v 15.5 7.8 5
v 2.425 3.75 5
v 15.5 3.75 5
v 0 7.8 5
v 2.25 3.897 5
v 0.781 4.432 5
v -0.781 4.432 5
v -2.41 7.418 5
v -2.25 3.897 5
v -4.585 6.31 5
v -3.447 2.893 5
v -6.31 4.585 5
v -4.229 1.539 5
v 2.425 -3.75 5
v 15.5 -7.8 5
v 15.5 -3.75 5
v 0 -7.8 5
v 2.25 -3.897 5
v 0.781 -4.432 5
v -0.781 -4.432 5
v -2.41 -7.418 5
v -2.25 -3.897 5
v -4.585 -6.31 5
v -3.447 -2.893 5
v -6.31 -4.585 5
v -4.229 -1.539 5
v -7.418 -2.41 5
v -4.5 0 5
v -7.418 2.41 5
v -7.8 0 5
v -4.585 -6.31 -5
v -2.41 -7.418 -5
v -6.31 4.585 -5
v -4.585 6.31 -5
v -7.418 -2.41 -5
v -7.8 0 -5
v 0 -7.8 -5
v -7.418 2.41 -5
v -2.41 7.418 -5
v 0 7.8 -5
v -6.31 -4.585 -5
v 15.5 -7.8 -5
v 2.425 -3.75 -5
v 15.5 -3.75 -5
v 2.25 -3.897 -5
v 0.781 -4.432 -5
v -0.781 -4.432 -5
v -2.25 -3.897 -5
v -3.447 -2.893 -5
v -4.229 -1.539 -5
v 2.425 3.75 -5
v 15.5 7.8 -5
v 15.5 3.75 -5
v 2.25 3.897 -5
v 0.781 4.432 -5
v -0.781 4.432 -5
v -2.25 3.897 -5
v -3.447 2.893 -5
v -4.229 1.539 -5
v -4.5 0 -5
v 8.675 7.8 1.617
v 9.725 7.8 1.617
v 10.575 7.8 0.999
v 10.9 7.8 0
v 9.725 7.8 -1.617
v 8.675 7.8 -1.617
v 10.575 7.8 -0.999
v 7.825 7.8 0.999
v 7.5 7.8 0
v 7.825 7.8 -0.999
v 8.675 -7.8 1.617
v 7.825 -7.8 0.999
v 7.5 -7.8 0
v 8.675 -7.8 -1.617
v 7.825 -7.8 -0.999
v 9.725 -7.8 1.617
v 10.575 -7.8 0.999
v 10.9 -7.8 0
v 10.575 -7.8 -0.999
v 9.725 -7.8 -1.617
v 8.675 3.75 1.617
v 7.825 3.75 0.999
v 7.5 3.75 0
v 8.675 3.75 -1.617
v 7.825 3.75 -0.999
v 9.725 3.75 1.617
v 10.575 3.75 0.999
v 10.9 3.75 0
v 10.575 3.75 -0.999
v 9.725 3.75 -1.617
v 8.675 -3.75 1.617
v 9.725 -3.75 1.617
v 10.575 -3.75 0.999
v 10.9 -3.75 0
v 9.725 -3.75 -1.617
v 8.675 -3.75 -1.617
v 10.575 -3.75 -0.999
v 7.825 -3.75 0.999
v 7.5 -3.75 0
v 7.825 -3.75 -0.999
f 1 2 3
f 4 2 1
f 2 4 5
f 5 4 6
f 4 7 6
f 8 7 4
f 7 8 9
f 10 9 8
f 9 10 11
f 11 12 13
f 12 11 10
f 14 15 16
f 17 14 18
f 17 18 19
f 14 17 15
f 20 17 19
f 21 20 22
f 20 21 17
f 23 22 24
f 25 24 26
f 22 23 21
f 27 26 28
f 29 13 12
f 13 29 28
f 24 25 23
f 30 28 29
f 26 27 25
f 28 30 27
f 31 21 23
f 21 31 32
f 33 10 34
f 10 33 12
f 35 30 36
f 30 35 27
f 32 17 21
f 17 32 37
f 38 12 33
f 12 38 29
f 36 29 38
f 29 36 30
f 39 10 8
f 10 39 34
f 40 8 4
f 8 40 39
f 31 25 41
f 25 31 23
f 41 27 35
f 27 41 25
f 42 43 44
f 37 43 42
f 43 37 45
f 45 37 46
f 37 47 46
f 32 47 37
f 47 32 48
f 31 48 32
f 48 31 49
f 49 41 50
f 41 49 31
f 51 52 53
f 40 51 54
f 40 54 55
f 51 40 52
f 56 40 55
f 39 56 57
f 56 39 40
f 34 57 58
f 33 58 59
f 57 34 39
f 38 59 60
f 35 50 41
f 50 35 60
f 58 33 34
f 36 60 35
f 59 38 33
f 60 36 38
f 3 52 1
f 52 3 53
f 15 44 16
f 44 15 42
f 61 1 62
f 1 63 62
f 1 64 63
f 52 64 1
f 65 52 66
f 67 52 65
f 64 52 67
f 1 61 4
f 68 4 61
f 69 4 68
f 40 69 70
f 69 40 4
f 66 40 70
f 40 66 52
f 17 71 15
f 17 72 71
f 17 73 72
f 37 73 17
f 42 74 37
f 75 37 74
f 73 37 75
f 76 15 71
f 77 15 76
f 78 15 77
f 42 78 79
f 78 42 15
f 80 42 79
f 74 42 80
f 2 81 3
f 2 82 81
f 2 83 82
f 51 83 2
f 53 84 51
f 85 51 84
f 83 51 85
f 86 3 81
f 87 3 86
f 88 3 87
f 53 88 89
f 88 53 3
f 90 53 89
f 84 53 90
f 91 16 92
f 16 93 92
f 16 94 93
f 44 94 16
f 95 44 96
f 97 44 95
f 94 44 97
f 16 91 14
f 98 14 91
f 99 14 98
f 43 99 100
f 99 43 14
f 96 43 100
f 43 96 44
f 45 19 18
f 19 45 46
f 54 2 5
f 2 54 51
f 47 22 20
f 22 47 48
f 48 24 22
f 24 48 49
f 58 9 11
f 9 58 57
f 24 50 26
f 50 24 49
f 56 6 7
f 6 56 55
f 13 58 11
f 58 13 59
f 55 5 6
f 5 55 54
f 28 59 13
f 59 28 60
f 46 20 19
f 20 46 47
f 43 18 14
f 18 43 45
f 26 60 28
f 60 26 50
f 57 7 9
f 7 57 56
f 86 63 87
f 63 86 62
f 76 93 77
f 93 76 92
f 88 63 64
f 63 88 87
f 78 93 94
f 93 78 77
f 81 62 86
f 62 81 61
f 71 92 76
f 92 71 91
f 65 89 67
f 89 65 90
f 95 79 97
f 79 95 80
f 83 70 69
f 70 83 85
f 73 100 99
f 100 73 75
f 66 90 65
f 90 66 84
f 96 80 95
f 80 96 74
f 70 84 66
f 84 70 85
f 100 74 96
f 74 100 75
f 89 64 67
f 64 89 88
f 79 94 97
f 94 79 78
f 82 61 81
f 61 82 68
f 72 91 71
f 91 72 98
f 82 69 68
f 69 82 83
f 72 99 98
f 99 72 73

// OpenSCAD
// file: functions.scad
// PRUSA Mendel  
// Functions used in many files
// GNU GPL v3
// Josef Průša
// josefprusa@me.com
// prusadjs.cz
// http://www.reprap.org/wiki/Prusa_Mendel
// http://github.com/prusajr/PrusaMendel


module nut(d,h,horizontal=true){
cornerdiameter =  (d / 2) / cos (180 / 6);
cylinder(h = h, r = cornerdiameter, $fn = 6);
if(horizontal){
for(i = [1:6]){
	rotate([0,0,60*i]) translate([-cornerdiameter-0.2,0,0]) rotate([0,0,-45]) cube(size = [2,2,h]);
}}
}

// Based on nophead research
module polyhole(d,h) {
    n = max(round(2 * d),3);
    rotate([0,0,180])
        cylinder(h = h, r = (d / 2) / cos (180 / n), $fn = n);
}




module roundcorner(diameter){
	difference(){
		cube(size = [diameter,diameter,99], center = false);
		translate(v = [diameter, diameter, 0]) cylinder(h = 100, r=diameter, center=false,$fn = max(3*diameter,20));
	}
}

module t25_indent()
{
	union()
	{
		for(z=[-5:5])
			translate([0,-5,z*2.5])
				difference()
				{
					cube([30,10,1.25],center=true);
					translate([0, 5, 1.7])
						rotate([-45,0,0])
							cube([40,10,2],center=true);
					translate([0, 5, -1.7])
						rotate([45,0,0])
							cube([40,10,2],center=true);

				}
	}
}
// file: configuration.scad
// PRUSA Mendel  
// Configuration file
// GNU GPL v2
// Josef Pra
// josefprusa@me.com
// prusadjs.cz
// http://www.reprap.org/wiki/Prusa_Mendel
// http://github.com/prusajr/PrusaMendel


// PLEASE SELECT ONE OF THE CONFIGURATIONS BELOW
// BY UN-COMMENTING IT


variant=0; //0 for metric
//variant=1; //1 for SAE
if(variant==0){
echo("variant: metric");
}else if(variant==1){
echo("variant: sae");
} else{
echo("WARNING: INVALID CONFIGURATION");
}




vars=[
//[m8_dia,m8_nut, m4_dia, m4_nut, m3_dia, m3_nut, bush_dia, mot_shaft, bush_rod, bush_outerdia, bush_length, m5_dia, m5_nut]
[9, 16.4, 5,9, 3.4, 6.5, 11, 5.3, 8, 16, 11, 5.6, 10],//metric - M3 nut was 7; M3 was 4.4
[9,15.7,5.5,10.6,5.5,10.6,11.5,5.3,7.9375,16,11,5.6, 10]//SAE
];


//BUSHING TYPE Can generate three versions
// 1 - regular old ones
// 2 - helical ones
// 3 - holders for brass or any other bought bushings
bushing_type = 2;


//Round corner diameter
round_corner_diameter = 8;


//Thin wall size
layer_height = 0.4;
perimeter_width_over_thicknes = 1.6;
infill_widht_over_thickness = 1.55;
thin_wall = 2*(perimeter_width_over_thicknes*layer_height+infill_widht_over_thickness*layer_height);
if(thin_wall<2){
	echo("Check thin wall size, its below 2mm!");
}
echo(thin_wall);


//DO NOT TOUCH THIS SECTION!
m8_diameter = vars[variant][0];
m8_nut_diameter = vars[variant][1];
m4_diameter = vars[variant][2];
m4_nut_diameter = vars[variant][3];
m3_diameter = vars[variant][4];
m3_nut_diameter = vars[variant][5];
bushing_diameter = vars[variant][6];
motor_shaft=vars[variant][7];
bushing_rodsize = vars[variant][8];
bushing_outerDiameter = vars[variant][9];
bushing_lenght = vars[variant][10];
m5_diameter = vars[variant][11];
m5_nut_diameter = vars[variant][12];



// MINI-HUXLEY VERSION (TODO, just place holder)
// include <configuration-huxley.scad>


// MEGA VERSION (TODO, just place holder)
// include <configuration-mega.scad>

// Gap between the X rods

x_rod_centres=70;
y_rod_centres=183;
belt_width=6;
belt_clamp_centres=18;

vertex_x_rod_1=[11.013,59.912];
vertex_x_rod_2=[40.274,9.249,0];
vertex_x_rod_gap=sqrt((vertex_x_rod_1.x-vertex_x_rod_2.x)*(vertex_x_rod_1.x-vertex_x_rod_2.x) +(vertex_x_rod_1.y-vertex_x_rod_2.y)*(vertex_x_rod_1.y-vertex_x_rod_2.y) );

// Some basic functions, probably should be somewhere else
module roundcorner(diameter){
	difference(){
		cube(size = [diameter,diameter,99], center = false);
		translate(v = [diameter, diameter, 0]) cylinder(h = 100, r=diameter, center=true);
	}
}

include <functions.scad>
// main file
// PRUSA Mendel  
// Endstop holder
// Used to attach endstops to 8mm rods
// GNU GPL v2
// Josef Průša
// josefprusa@me.com
// prusadjs.cz
// http://www.reprap.org/wiki/Prusa_Mendel
// http://github.com/prusajr/PrusaMendel

// Modified by Adrian to include support for sub-min microswitches and to make PCB mounts too. 15 May 2011

include <configuration.scad>

// Print three of the objects generated when pcb_mount is true, two of those generated
// when it is false and switch_add is 0, and one when it is false and switch_add is 11.

pcb_mount=true; // Set false for endstop
switch_add =0; // Set 0 for ordinary endstop, 11 for Z with adjuster

/**
 *@name Endstop holder
 *@using 1 m3x20
 *@using 1 m3nut
 *@using 2 m3washer
 */
module endstop(){
outer_diameter = m8_diameter/2+3.3;
screw_hole_spacing = 9.5; // Set to 20 to get standard design
opening_size = m8_diameter-1.5; //openingsize
switch_screw_hole_radius = 1.3; // Set to m3_diameter/2 to get standard design

translate([-outer_diameter, -outer_diameter, -5]) 
difference(){

	union(){


		translate([outer_diameter, outer_diameter, 0]) cylinder(h =10, r = outer_diameter, $fn = 20);
		translate([outer_diameter, 0, 0]) cube([15.5,outer_diameter*2,10]);
		if(!pcb_mount)
			translate([-42,0, 0]) cube([50, 4, 10]);
	}

	// Chop the end just after the hole

	translate([-(56+screw_hole_spacing+ switch_screw_hole_radius+switch_add), -10, -10]) 
		cube([50, 50, 50]);

	translate([9, outer_diameter-opening_size/2, 0]) cube([18,opening_size,20]);
	translate([outer_diameter, outer_diameter, 0]) cylinder(h =20, r = m8_diameter/2, $fn = 18);
	translate([17, 17, 5]) rotate([90, 0, 0]) cylinder(h =20, r = m3_diameter/2, $fn = 10);
	translate([-4-switch_add, 17, 5]) rotate([90, 0, 0]) cylinder(h =20, r = switch_screw_hole_radius, $fn = 10);
	translate([-(4+switch_add+screw_hole_spacing), 17, 5]) rotate([90, 0, 0]) cylinder(h =20, r = switch_screw_hole_radius, $fn = 10);
}
}
endstop();
